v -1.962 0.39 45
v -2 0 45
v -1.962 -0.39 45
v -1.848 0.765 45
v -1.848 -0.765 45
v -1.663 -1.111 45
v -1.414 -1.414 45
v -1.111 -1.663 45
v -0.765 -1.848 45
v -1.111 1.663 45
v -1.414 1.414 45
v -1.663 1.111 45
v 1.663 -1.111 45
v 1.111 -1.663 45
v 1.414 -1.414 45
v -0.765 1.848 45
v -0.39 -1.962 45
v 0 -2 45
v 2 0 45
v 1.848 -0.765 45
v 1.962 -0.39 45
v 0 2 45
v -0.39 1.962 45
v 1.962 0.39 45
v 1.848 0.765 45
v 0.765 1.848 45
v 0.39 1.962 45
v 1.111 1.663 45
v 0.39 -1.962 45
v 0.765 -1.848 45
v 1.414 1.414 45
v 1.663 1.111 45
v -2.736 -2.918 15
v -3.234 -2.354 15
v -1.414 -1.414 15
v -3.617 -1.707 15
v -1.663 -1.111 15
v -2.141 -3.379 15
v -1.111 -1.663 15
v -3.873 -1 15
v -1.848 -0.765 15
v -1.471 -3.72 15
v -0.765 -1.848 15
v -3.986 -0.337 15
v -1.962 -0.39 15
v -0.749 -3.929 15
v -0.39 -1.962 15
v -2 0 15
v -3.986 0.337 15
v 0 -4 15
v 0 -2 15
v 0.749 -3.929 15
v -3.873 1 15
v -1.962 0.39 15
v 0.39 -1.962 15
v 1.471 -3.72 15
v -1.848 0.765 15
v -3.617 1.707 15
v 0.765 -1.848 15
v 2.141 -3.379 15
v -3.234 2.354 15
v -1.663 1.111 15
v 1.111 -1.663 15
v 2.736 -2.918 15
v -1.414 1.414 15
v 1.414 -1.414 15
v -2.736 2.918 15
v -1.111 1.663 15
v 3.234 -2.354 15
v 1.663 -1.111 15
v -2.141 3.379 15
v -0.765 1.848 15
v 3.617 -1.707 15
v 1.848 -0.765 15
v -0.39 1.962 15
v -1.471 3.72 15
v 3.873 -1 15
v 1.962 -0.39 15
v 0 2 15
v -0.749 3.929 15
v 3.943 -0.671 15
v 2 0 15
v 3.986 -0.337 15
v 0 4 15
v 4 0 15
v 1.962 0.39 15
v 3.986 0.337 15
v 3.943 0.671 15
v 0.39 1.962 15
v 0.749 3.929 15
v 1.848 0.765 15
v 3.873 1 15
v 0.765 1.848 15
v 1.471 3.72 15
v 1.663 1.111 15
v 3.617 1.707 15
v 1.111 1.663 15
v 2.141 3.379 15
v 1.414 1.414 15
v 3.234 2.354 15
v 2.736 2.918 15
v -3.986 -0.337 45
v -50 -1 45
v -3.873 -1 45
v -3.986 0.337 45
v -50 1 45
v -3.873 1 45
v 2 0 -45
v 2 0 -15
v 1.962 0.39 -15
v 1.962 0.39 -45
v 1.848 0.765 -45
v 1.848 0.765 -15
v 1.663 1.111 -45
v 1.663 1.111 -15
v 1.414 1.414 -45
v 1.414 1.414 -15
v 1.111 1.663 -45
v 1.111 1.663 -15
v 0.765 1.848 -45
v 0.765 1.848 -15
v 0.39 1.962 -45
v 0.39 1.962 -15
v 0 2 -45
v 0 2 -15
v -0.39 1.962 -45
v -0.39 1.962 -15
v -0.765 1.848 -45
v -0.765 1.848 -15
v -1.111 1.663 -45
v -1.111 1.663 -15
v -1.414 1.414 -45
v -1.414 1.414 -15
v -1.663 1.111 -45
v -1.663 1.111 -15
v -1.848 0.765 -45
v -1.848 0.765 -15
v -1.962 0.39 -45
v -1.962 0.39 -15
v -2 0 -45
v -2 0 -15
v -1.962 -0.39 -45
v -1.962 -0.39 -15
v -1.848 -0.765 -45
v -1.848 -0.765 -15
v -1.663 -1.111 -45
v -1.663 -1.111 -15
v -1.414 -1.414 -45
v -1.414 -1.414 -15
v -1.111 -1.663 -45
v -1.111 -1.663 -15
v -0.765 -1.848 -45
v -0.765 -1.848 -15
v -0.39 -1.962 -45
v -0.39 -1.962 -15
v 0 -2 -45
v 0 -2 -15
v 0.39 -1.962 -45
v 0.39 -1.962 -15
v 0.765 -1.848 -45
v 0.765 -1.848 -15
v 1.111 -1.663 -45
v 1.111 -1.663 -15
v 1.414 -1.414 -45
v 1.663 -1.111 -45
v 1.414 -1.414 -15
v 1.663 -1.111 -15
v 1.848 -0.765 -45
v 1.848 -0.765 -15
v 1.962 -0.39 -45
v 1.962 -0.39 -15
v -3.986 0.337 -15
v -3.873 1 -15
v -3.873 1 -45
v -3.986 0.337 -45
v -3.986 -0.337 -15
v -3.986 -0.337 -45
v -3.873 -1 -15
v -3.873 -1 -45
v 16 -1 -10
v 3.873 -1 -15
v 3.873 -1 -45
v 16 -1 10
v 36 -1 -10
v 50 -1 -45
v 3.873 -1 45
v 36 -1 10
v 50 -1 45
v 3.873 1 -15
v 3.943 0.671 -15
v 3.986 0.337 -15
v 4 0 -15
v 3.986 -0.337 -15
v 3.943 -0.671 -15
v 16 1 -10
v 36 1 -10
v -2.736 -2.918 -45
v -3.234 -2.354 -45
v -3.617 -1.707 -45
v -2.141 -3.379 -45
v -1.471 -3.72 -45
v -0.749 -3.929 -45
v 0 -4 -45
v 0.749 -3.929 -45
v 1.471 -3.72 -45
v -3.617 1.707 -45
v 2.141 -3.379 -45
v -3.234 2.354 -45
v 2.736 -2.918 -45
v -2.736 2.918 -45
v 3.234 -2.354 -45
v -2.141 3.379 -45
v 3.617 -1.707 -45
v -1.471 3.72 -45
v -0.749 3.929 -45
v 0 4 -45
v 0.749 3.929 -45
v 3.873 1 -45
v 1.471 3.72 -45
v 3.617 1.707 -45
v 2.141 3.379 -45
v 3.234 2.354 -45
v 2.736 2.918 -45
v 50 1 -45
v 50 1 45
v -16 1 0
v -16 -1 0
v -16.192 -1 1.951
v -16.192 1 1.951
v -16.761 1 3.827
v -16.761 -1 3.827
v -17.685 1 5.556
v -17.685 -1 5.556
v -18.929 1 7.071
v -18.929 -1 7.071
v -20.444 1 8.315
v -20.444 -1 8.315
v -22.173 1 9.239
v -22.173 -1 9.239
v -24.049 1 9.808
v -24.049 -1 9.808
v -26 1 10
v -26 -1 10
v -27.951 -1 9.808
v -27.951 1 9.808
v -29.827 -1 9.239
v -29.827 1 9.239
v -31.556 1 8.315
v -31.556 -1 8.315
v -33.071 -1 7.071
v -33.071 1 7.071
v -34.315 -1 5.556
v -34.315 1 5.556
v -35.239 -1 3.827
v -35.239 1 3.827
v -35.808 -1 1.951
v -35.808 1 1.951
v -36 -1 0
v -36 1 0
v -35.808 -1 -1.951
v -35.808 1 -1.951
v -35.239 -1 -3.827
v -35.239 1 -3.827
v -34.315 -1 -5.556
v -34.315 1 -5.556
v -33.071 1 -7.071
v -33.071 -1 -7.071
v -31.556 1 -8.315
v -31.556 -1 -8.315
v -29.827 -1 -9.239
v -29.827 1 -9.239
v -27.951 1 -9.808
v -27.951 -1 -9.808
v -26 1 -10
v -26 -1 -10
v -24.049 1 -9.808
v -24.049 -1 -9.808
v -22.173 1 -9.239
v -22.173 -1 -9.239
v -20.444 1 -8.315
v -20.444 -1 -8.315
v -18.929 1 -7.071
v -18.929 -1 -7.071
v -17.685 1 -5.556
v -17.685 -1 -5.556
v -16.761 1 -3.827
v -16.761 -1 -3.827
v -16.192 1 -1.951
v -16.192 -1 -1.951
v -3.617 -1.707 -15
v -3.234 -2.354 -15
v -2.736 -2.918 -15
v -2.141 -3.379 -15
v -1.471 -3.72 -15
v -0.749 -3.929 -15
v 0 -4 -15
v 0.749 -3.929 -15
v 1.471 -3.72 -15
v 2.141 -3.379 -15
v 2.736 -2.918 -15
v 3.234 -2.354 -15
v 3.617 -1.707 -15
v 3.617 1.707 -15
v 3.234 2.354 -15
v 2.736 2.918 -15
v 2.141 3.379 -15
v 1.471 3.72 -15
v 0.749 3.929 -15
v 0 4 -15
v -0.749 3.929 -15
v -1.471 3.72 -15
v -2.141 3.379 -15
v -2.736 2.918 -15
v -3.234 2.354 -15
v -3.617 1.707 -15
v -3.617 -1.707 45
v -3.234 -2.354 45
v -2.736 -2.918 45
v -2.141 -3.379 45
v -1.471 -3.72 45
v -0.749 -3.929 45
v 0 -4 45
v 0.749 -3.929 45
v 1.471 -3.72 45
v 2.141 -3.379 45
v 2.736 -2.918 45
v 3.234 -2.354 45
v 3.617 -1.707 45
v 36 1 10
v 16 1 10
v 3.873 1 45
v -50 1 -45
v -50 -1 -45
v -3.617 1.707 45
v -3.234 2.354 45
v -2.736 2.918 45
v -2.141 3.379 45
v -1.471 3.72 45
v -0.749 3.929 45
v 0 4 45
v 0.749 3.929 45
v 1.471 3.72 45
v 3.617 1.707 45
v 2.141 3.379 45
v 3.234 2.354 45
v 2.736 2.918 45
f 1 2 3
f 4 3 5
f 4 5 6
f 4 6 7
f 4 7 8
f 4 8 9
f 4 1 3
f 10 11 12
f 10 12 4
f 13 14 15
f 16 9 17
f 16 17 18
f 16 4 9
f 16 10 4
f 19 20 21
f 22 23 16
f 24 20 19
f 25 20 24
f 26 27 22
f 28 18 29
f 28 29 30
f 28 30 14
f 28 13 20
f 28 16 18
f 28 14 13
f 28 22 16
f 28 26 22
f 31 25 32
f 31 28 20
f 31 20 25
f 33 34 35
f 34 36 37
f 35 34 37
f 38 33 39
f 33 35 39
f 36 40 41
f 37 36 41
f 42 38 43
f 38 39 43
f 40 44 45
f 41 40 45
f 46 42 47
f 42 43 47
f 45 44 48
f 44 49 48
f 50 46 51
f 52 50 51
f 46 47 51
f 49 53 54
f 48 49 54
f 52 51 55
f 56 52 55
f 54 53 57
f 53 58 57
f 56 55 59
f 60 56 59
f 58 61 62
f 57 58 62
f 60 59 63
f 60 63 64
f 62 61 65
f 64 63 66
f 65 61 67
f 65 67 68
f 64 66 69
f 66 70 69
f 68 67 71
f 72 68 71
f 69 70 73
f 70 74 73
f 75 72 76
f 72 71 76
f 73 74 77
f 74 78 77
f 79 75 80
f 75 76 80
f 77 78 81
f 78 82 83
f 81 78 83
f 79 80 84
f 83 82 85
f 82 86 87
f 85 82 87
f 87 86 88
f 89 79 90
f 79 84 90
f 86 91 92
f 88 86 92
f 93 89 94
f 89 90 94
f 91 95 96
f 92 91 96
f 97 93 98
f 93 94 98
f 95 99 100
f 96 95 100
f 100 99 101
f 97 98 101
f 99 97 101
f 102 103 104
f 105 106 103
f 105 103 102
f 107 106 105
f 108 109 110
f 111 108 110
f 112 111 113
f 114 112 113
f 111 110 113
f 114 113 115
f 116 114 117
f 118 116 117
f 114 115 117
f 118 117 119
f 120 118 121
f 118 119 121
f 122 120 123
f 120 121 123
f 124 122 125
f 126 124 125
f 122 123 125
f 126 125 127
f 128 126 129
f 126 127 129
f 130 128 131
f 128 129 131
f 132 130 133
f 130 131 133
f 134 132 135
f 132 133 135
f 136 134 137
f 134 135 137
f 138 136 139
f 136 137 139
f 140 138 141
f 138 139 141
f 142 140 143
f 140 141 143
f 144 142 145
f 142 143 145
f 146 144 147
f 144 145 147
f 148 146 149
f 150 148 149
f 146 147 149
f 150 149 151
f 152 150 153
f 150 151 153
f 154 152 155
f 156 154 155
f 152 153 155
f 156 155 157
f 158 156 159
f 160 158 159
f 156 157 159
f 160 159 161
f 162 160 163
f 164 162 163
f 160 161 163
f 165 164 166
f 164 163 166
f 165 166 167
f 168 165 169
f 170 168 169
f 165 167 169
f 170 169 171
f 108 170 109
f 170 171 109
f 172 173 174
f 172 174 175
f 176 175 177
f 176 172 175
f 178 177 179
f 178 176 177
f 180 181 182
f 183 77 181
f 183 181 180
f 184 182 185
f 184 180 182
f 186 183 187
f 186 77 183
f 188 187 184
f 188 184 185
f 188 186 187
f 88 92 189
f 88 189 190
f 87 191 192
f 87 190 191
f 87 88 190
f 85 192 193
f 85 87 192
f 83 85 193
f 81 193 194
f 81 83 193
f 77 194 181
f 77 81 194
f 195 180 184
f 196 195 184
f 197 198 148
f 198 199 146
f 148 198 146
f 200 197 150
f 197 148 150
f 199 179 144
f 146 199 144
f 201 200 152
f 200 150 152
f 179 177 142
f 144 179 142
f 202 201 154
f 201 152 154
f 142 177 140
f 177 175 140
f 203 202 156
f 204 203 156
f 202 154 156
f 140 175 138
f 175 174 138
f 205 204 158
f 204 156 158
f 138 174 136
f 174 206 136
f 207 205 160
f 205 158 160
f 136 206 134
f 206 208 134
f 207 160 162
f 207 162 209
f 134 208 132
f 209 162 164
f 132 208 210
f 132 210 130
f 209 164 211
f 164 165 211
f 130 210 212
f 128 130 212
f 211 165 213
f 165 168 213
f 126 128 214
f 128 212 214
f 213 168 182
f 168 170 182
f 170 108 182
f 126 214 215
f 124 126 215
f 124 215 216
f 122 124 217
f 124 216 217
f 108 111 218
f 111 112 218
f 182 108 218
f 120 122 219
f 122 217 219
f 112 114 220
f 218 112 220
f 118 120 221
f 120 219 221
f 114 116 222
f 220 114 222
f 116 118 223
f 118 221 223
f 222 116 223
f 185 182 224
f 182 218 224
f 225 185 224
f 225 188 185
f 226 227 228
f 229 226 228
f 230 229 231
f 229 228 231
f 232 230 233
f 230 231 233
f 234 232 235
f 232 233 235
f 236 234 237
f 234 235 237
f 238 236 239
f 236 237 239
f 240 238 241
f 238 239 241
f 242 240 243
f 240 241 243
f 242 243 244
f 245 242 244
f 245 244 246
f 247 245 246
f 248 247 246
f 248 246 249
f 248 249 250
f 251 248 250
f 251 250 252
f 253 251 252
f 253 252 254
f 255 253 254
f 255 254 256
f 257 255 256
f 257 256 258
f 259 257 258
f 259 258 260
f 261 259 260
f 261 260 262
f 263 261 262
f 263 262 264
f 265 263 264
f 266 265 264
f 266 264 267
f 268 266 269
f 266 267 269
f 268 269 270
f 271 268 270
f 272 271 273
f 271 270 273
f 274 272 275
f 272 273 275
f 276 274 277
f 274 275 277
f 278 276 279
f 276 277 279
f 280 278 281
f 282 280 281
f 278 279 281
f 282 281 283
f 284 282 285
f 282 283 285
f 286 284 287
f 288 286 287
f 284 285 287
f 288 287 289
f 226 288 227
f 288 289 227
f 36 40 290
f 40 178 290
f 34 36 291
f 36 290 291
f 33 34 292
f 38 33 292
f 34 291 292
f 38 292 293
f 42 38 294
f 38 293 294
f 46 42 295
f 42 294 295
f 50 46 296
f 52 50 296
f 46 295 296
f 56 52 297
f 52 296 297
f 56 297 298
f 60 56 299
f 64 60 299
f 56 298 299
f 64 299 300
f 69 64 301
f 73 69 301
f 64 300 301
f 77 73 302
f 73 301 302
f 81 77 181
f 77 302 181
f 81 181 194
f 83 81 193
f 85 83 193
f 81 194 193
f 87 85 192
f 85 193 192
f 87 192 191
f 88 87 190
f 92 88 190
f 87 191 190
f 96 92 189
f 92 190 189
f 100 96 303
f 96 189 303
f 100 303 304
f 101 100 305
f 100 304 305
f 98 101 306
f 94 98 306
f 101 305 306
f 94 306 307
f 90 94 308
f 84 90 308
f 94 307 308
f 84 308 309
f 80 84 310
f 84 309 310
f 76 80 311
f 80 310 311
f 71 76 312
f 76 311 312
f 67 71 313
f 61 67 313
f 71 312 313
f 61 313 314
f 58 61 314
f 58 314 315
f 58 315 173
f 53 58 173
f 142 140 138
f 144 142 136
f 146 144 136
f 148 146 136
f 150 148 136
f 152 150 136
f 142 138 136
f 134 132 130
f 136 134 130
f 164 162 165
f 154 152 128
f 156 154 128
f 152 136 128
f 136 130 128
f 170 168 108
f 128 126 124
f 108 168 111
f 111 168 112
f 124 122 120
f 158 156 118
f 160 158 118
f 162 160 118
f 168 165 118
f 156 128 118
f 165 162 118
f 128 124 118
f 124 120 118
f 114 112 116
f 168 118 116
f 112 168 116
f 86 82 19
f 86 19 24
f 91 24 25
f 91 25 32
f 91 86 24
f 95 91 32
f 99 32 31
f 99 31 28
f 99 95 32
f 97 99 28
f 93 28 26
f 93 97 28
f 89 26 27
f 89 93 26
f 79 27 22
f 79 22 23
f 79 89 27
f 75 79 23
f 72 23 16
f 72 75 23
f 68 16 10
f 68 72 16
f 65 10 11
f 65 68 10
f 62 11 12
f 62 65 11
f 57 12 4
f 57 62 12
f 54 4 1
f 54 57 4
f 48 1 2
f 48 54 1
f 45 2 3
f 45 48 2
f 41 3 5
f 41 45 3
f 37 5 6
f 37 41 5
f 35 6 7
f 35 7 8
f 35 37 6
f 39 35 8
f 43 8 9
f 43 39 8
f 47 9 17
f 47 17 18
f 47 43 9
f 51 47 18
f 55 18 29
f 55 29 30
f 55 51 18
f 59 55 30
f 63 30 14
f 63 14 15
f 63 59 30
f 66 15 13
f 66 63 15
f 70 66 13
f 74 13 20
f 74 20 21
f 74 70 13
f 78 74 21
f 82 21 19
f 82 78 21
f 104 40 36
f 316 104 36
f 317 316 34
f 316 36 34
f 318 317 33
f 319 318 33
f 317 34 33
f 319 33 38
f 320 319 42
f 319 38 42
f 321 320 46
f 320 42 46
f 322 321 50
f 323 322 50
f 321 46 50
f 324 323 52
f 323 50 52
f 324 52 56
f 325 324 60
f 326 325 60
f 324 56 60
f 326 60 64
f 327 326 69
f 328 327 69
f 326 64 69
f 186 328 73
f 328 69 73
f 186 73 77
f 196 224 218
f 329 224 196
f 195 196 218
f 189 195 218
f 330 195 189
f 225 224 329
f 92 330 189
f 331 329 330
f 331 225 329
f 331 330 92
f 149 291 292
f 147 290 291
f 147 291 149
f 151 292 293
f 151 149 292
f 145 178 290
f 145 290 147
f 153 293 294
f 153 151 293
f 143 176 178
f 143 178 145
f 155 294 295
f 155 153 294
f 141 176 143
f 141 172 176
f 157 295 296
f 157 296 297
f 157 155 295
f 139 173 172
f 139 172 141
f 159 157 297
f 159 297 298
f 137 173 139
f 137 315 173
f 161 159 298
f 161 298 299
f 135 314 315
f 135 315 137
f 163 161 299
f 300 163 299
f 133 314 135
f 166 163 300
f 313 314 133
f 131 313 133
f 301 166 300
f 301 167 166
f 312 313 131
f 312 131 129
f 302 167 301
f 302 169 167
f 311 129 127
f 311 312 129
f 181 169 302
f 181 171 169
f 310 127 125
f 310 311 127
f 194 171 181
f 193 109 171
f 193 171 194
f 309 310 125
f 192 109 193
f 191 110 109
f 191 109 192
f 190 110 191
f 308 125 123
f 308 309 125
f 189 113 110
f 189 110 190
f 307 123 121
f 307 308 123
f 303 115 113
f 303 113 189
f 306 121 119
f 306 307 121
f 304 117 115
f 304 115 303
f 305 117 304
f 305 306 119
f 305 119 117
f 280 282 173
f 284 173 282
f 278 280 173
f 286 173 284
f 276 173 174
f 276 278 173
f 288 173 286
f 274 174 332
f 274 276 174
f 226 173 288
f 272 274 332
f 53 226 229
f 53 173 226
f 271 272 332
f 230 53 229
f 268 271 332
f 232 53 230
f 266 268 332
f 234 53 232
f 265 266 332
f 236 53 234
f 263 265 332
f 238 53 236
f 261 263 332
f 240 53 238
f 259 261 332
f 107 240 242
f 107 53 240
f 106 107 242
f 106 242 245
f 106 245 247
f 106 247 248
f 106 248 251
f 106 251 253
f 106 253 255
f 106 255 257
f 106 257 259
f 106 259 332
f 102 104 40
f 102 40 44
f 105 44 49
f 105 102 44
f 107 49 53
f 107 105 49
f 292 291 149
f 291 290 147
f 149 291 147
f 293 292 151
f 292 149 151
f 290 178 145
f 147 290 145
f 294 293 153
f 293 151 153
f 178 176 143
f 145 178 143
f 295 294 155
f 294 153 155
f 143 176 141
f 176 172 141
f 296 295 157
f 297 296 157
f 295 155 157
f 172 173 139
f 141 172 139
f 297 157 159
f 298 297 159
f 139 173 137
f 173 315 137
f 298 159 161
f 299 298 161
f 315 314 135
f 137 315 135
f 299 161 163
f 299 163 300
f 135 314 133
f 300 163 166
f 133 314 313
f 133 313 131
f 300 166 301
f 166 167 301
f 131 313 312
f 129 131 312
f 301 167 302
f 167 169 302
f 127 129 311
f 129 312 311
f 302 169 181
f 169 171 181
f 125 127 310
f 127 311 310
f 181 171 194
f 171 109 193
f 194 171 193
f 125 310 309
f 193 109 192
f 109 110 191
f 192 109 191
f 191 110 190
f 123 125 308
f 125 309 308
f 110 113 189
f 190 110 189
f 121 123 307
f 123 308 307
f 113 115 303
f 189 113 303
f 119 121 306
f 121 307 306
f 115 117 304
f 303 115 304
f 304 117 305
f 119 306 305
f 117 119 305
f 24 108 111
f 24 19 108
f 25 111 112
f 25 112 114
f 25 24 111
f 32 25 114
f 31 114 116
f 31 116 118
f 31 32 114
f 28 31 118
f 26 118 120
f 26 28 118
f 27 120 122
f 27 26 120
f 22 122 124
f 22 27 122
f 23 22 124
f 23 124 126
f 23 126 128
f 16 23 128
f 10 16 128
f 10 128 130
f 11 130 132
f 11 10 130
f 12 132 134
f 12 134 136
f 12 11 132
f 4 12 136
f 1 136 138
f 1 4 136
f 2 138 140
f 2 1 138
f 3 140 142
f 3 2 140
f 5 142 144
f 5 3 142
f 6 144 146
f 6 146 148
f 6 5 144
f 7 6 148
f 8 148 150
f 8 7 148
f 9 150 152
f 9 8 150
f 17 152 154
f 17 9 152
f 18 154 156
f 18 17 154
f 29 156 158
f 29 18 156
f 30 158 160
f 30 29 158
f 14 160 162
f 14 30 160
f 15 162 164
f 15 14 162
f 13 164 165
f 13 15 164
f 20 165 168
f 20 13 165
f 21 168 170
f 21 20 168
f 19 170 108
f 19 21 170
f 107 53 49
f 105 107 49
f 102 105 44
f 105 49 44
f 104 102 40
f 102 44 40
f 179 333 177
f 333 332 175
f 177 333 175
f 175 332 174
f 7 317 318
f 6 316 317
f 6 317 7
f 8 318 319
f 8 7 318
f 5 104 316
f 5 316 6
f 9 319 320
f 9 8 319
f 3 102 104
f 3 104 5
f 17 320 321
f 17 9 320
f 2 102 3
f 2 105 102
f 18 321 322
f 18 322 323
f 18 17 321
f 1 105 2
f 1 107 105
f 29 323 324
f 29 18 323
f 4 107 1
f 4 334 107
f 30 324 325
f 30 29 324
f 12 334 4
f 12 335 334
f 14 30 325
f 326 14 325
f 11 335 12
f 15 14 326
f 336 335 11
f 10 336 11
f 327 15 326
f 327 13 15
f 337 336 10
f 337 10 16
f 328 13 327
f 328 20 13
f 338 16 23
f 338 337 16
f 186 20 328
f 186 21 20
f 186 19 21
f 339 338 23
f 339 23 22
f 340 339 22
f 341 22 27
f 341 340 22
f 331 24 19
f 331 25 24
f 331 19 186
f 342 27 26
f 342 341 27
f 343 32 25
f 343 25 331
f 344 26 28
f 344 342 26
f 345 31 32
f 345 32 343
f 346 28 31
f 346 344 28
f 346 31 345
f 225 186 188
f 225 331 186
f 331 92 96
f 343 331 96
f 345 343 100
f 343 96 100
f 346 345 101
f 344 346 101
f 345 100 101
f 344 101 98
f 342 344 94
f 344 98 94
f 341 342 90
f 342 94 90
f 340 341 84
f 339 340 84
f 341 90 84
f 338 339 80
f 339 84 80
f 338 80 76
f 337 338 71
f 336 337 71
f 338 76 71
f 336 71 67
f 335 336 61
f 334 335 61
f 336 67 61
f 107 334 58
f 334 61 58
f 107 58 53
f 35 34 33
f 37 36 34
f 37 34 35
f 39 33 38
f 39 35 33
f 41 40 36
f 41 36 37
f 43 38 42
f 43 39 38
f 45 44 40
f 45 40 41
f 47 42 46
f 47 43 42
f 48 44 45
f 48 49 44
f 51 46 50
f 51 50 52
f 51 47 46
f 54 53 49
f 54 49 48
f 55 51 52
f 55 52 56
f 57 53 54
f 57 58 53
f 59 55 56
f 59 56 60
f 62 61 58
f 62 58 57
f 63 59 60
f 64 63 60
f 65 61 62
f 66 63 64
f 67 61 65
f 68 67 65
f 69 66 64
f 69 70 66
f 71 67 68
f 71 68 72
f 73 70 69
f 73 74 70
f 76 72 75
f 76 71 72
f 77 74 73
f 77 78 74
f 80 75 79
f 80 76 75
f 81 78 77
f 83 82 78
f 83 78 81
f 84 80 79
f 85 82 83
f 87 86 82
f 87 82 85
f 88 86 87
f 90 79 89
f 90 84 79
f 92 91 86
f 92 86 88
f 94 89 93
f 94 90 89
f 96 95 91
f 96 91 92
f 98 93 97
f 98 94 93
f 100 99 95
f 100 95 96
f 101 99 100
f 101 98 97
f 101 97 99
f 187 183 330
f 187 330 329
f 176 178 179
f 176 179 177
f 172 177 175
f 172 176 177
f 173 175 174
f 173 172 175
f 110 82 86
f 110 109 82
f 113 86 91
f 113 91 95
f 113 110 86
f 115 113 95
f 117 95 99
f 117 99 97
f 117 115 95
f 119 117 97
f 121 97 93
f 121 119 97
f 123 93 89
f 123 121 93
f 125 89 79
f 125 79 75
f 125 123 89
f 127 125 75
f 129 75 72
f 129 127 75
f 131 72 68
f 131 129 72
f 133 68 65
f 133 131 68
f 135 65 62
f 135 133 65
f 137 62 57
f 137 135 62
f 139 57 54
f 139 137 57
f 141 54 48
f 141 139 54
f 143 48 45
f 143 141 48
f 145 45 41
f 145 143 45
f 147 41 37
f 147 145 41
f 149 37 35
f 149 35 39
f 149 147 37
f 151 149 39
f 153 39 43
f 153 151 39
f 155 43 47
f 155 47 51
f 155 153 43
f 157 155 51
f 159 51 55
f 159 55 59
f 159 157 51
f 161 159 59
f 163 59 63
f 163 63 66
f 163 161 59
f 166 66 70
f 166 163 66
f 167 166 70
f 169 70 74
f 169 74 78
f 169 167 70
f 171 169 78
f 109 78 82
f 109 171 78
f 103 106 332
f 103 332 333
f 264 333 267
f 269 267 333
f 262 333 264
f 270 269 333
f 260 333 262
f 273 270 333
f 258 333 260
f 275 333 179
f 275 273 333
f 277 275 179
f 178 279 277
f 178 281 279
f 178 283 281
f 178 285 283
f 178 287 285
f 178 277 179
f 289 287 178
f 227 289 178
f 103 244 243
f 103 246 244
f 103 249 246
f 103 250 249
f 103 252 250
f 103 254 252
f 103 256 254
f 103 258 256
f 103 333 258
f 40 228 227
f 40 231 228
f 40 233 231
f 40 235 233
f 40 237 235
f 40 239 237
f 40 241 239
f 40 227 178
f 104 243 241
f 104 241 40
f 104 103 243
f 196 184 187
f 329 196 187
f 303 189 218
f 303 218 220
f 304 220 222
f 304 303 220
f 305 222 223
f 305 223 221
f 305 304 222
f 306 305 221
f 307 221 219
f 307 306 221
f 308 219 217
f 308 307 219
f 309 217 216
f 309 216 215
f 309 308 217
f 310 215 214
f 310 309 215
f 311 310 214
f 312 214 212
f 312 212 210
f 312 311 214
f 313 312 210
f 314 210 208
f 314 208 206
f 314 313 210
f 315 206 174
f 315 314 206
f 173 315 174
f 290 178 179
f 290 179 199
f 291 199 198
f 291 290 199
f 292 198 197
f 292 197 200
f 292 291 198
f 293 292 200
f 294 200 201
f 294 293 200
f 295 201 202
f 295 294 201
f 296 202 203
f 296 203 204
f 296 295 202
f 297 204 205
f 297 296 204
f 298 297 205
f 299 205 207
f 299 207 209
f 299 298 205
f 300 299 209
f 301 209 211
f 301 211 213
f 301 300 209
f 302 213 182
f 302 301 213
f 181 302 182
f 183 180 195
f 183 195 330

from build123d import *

# Parameters (mm, degrees)
F0_R      = 2
F1_DEPTH  = 45
F2_DEPTH  = 45
F3_DEPTH  = 15
F4_DEPTH  = 45
F5_DEPTH  = 30
F6_DEPTH  = 30
F7_R      = 10
F8_DEPTH  = 5.001
F9_W      = 20
F9_H      = 20
F10_DEPTH = 5.001


with BuildPart() as f1:
    # F0 (on Top) → F1 (new body, symmetric)
    with BuildSketch(Plane.XY):
        Circle(F0_R)
    extrude(amount=F1_DEPTH, both=True)


with BuildPart() as f2:
    # F0 (on Top) → F2 (new body, symmetric)
    with BuildSketch(Plane.XY):
        with BuildLine():
            ThreePointArc((-3.8729833462, -1), (-4, 0), (-3.8729833462, 1))
            Line((-3.8729833462, 1), (-50, 1))
            Line((-50, 1), (-50, -1))
            Line((-50, -1), (-3.8729833462, -1))
        make_face()
    extrude(amount=F2_DEPTH, both=True)

    # F0 (on Top) → F3 (join, symmetric)
    with BuildSketch(Plane.XY):
        with BuildLine():
            ThreePointArc((3.8729833462, -1), (3.9681187851, -0.5040171699), (4, 0))
            ThreePointArc((4, 0), (3.9681187851, 0.5040171699), (3.8729833462, 1))
            ThreePointArc((3.8729833462, 1), (0, 4), (-3.8729833462, 1))
            ThreePointArc((-3.8729833462, 1), (-4, 0), (-3.8729833462, -1))
            ThreePointArc((-3.8729833462, -1), (0, -4), (3.8729833462, -1))
        make_face()
        Circle(F0_R, mode=Mode.SUBTRACT)
    extrude(amount=F3_DEPTH, both=True)


with BuildPart() as f4:
    # F0 (on Top) → F4 (new body, symmetric)
    with BuildSketch(Plane.XY):
        with BuildLine():
            ThreePointArc((3.8729833462, 1), (3.9681187851, 0.5040171699), (4, 0))
            ThreePointArc((4, 0), (3.9681187851, -0.5040171699), (3.8729833462, -1))
            Line((3.8729833462, -1), (50, -1))
            Line((50, -1), (50, 1))
            Line((50, 1), (3.8729833462, 1))
        make_face()
    extrude(amount=F4_DEPTH, both=True)

    # F5 (add, through all): a face of the model
    f5_faces = [f2.part.faces().sort_by_distance(p)[0] for p in [
        (-3.886862915, 0, 15),
    ]]
    extrude(f5_faces, amount=F5_DEPTH)

    # F6 (add, through all): a face of the model
    f6_faces = [f2.part.faces().sort_by_distance(p)[0] for p in [
        (-3.886862915, 0, -15),
    ]]
    extrude(f6_faces, amount=F6_DEPTH)

    # F9 (on face) → F10 (cut, through all)
    with BuildSketch(Plane.XZ.offset(1)):
        with Locations((26, 0)):
            Rectangle(F9_W, F9_H)
    extrude(amount=-F10_DEPTH, mode=Mode.SUBTRACT)


with BuildPart() as f2_1:
    add(f2.part)

    # F7 (on face) → F8 (cut, through all)
    with BuildSketch(Plane.XZ.offset(1)):
        with Locations((-26, 0)):
            Circle(F7_R)
    extrude(amount=-F8_DEPTH, mode=Mode.SUBTRACT)


solid = Compound([f1.part, f4.part, f2_1.part])
